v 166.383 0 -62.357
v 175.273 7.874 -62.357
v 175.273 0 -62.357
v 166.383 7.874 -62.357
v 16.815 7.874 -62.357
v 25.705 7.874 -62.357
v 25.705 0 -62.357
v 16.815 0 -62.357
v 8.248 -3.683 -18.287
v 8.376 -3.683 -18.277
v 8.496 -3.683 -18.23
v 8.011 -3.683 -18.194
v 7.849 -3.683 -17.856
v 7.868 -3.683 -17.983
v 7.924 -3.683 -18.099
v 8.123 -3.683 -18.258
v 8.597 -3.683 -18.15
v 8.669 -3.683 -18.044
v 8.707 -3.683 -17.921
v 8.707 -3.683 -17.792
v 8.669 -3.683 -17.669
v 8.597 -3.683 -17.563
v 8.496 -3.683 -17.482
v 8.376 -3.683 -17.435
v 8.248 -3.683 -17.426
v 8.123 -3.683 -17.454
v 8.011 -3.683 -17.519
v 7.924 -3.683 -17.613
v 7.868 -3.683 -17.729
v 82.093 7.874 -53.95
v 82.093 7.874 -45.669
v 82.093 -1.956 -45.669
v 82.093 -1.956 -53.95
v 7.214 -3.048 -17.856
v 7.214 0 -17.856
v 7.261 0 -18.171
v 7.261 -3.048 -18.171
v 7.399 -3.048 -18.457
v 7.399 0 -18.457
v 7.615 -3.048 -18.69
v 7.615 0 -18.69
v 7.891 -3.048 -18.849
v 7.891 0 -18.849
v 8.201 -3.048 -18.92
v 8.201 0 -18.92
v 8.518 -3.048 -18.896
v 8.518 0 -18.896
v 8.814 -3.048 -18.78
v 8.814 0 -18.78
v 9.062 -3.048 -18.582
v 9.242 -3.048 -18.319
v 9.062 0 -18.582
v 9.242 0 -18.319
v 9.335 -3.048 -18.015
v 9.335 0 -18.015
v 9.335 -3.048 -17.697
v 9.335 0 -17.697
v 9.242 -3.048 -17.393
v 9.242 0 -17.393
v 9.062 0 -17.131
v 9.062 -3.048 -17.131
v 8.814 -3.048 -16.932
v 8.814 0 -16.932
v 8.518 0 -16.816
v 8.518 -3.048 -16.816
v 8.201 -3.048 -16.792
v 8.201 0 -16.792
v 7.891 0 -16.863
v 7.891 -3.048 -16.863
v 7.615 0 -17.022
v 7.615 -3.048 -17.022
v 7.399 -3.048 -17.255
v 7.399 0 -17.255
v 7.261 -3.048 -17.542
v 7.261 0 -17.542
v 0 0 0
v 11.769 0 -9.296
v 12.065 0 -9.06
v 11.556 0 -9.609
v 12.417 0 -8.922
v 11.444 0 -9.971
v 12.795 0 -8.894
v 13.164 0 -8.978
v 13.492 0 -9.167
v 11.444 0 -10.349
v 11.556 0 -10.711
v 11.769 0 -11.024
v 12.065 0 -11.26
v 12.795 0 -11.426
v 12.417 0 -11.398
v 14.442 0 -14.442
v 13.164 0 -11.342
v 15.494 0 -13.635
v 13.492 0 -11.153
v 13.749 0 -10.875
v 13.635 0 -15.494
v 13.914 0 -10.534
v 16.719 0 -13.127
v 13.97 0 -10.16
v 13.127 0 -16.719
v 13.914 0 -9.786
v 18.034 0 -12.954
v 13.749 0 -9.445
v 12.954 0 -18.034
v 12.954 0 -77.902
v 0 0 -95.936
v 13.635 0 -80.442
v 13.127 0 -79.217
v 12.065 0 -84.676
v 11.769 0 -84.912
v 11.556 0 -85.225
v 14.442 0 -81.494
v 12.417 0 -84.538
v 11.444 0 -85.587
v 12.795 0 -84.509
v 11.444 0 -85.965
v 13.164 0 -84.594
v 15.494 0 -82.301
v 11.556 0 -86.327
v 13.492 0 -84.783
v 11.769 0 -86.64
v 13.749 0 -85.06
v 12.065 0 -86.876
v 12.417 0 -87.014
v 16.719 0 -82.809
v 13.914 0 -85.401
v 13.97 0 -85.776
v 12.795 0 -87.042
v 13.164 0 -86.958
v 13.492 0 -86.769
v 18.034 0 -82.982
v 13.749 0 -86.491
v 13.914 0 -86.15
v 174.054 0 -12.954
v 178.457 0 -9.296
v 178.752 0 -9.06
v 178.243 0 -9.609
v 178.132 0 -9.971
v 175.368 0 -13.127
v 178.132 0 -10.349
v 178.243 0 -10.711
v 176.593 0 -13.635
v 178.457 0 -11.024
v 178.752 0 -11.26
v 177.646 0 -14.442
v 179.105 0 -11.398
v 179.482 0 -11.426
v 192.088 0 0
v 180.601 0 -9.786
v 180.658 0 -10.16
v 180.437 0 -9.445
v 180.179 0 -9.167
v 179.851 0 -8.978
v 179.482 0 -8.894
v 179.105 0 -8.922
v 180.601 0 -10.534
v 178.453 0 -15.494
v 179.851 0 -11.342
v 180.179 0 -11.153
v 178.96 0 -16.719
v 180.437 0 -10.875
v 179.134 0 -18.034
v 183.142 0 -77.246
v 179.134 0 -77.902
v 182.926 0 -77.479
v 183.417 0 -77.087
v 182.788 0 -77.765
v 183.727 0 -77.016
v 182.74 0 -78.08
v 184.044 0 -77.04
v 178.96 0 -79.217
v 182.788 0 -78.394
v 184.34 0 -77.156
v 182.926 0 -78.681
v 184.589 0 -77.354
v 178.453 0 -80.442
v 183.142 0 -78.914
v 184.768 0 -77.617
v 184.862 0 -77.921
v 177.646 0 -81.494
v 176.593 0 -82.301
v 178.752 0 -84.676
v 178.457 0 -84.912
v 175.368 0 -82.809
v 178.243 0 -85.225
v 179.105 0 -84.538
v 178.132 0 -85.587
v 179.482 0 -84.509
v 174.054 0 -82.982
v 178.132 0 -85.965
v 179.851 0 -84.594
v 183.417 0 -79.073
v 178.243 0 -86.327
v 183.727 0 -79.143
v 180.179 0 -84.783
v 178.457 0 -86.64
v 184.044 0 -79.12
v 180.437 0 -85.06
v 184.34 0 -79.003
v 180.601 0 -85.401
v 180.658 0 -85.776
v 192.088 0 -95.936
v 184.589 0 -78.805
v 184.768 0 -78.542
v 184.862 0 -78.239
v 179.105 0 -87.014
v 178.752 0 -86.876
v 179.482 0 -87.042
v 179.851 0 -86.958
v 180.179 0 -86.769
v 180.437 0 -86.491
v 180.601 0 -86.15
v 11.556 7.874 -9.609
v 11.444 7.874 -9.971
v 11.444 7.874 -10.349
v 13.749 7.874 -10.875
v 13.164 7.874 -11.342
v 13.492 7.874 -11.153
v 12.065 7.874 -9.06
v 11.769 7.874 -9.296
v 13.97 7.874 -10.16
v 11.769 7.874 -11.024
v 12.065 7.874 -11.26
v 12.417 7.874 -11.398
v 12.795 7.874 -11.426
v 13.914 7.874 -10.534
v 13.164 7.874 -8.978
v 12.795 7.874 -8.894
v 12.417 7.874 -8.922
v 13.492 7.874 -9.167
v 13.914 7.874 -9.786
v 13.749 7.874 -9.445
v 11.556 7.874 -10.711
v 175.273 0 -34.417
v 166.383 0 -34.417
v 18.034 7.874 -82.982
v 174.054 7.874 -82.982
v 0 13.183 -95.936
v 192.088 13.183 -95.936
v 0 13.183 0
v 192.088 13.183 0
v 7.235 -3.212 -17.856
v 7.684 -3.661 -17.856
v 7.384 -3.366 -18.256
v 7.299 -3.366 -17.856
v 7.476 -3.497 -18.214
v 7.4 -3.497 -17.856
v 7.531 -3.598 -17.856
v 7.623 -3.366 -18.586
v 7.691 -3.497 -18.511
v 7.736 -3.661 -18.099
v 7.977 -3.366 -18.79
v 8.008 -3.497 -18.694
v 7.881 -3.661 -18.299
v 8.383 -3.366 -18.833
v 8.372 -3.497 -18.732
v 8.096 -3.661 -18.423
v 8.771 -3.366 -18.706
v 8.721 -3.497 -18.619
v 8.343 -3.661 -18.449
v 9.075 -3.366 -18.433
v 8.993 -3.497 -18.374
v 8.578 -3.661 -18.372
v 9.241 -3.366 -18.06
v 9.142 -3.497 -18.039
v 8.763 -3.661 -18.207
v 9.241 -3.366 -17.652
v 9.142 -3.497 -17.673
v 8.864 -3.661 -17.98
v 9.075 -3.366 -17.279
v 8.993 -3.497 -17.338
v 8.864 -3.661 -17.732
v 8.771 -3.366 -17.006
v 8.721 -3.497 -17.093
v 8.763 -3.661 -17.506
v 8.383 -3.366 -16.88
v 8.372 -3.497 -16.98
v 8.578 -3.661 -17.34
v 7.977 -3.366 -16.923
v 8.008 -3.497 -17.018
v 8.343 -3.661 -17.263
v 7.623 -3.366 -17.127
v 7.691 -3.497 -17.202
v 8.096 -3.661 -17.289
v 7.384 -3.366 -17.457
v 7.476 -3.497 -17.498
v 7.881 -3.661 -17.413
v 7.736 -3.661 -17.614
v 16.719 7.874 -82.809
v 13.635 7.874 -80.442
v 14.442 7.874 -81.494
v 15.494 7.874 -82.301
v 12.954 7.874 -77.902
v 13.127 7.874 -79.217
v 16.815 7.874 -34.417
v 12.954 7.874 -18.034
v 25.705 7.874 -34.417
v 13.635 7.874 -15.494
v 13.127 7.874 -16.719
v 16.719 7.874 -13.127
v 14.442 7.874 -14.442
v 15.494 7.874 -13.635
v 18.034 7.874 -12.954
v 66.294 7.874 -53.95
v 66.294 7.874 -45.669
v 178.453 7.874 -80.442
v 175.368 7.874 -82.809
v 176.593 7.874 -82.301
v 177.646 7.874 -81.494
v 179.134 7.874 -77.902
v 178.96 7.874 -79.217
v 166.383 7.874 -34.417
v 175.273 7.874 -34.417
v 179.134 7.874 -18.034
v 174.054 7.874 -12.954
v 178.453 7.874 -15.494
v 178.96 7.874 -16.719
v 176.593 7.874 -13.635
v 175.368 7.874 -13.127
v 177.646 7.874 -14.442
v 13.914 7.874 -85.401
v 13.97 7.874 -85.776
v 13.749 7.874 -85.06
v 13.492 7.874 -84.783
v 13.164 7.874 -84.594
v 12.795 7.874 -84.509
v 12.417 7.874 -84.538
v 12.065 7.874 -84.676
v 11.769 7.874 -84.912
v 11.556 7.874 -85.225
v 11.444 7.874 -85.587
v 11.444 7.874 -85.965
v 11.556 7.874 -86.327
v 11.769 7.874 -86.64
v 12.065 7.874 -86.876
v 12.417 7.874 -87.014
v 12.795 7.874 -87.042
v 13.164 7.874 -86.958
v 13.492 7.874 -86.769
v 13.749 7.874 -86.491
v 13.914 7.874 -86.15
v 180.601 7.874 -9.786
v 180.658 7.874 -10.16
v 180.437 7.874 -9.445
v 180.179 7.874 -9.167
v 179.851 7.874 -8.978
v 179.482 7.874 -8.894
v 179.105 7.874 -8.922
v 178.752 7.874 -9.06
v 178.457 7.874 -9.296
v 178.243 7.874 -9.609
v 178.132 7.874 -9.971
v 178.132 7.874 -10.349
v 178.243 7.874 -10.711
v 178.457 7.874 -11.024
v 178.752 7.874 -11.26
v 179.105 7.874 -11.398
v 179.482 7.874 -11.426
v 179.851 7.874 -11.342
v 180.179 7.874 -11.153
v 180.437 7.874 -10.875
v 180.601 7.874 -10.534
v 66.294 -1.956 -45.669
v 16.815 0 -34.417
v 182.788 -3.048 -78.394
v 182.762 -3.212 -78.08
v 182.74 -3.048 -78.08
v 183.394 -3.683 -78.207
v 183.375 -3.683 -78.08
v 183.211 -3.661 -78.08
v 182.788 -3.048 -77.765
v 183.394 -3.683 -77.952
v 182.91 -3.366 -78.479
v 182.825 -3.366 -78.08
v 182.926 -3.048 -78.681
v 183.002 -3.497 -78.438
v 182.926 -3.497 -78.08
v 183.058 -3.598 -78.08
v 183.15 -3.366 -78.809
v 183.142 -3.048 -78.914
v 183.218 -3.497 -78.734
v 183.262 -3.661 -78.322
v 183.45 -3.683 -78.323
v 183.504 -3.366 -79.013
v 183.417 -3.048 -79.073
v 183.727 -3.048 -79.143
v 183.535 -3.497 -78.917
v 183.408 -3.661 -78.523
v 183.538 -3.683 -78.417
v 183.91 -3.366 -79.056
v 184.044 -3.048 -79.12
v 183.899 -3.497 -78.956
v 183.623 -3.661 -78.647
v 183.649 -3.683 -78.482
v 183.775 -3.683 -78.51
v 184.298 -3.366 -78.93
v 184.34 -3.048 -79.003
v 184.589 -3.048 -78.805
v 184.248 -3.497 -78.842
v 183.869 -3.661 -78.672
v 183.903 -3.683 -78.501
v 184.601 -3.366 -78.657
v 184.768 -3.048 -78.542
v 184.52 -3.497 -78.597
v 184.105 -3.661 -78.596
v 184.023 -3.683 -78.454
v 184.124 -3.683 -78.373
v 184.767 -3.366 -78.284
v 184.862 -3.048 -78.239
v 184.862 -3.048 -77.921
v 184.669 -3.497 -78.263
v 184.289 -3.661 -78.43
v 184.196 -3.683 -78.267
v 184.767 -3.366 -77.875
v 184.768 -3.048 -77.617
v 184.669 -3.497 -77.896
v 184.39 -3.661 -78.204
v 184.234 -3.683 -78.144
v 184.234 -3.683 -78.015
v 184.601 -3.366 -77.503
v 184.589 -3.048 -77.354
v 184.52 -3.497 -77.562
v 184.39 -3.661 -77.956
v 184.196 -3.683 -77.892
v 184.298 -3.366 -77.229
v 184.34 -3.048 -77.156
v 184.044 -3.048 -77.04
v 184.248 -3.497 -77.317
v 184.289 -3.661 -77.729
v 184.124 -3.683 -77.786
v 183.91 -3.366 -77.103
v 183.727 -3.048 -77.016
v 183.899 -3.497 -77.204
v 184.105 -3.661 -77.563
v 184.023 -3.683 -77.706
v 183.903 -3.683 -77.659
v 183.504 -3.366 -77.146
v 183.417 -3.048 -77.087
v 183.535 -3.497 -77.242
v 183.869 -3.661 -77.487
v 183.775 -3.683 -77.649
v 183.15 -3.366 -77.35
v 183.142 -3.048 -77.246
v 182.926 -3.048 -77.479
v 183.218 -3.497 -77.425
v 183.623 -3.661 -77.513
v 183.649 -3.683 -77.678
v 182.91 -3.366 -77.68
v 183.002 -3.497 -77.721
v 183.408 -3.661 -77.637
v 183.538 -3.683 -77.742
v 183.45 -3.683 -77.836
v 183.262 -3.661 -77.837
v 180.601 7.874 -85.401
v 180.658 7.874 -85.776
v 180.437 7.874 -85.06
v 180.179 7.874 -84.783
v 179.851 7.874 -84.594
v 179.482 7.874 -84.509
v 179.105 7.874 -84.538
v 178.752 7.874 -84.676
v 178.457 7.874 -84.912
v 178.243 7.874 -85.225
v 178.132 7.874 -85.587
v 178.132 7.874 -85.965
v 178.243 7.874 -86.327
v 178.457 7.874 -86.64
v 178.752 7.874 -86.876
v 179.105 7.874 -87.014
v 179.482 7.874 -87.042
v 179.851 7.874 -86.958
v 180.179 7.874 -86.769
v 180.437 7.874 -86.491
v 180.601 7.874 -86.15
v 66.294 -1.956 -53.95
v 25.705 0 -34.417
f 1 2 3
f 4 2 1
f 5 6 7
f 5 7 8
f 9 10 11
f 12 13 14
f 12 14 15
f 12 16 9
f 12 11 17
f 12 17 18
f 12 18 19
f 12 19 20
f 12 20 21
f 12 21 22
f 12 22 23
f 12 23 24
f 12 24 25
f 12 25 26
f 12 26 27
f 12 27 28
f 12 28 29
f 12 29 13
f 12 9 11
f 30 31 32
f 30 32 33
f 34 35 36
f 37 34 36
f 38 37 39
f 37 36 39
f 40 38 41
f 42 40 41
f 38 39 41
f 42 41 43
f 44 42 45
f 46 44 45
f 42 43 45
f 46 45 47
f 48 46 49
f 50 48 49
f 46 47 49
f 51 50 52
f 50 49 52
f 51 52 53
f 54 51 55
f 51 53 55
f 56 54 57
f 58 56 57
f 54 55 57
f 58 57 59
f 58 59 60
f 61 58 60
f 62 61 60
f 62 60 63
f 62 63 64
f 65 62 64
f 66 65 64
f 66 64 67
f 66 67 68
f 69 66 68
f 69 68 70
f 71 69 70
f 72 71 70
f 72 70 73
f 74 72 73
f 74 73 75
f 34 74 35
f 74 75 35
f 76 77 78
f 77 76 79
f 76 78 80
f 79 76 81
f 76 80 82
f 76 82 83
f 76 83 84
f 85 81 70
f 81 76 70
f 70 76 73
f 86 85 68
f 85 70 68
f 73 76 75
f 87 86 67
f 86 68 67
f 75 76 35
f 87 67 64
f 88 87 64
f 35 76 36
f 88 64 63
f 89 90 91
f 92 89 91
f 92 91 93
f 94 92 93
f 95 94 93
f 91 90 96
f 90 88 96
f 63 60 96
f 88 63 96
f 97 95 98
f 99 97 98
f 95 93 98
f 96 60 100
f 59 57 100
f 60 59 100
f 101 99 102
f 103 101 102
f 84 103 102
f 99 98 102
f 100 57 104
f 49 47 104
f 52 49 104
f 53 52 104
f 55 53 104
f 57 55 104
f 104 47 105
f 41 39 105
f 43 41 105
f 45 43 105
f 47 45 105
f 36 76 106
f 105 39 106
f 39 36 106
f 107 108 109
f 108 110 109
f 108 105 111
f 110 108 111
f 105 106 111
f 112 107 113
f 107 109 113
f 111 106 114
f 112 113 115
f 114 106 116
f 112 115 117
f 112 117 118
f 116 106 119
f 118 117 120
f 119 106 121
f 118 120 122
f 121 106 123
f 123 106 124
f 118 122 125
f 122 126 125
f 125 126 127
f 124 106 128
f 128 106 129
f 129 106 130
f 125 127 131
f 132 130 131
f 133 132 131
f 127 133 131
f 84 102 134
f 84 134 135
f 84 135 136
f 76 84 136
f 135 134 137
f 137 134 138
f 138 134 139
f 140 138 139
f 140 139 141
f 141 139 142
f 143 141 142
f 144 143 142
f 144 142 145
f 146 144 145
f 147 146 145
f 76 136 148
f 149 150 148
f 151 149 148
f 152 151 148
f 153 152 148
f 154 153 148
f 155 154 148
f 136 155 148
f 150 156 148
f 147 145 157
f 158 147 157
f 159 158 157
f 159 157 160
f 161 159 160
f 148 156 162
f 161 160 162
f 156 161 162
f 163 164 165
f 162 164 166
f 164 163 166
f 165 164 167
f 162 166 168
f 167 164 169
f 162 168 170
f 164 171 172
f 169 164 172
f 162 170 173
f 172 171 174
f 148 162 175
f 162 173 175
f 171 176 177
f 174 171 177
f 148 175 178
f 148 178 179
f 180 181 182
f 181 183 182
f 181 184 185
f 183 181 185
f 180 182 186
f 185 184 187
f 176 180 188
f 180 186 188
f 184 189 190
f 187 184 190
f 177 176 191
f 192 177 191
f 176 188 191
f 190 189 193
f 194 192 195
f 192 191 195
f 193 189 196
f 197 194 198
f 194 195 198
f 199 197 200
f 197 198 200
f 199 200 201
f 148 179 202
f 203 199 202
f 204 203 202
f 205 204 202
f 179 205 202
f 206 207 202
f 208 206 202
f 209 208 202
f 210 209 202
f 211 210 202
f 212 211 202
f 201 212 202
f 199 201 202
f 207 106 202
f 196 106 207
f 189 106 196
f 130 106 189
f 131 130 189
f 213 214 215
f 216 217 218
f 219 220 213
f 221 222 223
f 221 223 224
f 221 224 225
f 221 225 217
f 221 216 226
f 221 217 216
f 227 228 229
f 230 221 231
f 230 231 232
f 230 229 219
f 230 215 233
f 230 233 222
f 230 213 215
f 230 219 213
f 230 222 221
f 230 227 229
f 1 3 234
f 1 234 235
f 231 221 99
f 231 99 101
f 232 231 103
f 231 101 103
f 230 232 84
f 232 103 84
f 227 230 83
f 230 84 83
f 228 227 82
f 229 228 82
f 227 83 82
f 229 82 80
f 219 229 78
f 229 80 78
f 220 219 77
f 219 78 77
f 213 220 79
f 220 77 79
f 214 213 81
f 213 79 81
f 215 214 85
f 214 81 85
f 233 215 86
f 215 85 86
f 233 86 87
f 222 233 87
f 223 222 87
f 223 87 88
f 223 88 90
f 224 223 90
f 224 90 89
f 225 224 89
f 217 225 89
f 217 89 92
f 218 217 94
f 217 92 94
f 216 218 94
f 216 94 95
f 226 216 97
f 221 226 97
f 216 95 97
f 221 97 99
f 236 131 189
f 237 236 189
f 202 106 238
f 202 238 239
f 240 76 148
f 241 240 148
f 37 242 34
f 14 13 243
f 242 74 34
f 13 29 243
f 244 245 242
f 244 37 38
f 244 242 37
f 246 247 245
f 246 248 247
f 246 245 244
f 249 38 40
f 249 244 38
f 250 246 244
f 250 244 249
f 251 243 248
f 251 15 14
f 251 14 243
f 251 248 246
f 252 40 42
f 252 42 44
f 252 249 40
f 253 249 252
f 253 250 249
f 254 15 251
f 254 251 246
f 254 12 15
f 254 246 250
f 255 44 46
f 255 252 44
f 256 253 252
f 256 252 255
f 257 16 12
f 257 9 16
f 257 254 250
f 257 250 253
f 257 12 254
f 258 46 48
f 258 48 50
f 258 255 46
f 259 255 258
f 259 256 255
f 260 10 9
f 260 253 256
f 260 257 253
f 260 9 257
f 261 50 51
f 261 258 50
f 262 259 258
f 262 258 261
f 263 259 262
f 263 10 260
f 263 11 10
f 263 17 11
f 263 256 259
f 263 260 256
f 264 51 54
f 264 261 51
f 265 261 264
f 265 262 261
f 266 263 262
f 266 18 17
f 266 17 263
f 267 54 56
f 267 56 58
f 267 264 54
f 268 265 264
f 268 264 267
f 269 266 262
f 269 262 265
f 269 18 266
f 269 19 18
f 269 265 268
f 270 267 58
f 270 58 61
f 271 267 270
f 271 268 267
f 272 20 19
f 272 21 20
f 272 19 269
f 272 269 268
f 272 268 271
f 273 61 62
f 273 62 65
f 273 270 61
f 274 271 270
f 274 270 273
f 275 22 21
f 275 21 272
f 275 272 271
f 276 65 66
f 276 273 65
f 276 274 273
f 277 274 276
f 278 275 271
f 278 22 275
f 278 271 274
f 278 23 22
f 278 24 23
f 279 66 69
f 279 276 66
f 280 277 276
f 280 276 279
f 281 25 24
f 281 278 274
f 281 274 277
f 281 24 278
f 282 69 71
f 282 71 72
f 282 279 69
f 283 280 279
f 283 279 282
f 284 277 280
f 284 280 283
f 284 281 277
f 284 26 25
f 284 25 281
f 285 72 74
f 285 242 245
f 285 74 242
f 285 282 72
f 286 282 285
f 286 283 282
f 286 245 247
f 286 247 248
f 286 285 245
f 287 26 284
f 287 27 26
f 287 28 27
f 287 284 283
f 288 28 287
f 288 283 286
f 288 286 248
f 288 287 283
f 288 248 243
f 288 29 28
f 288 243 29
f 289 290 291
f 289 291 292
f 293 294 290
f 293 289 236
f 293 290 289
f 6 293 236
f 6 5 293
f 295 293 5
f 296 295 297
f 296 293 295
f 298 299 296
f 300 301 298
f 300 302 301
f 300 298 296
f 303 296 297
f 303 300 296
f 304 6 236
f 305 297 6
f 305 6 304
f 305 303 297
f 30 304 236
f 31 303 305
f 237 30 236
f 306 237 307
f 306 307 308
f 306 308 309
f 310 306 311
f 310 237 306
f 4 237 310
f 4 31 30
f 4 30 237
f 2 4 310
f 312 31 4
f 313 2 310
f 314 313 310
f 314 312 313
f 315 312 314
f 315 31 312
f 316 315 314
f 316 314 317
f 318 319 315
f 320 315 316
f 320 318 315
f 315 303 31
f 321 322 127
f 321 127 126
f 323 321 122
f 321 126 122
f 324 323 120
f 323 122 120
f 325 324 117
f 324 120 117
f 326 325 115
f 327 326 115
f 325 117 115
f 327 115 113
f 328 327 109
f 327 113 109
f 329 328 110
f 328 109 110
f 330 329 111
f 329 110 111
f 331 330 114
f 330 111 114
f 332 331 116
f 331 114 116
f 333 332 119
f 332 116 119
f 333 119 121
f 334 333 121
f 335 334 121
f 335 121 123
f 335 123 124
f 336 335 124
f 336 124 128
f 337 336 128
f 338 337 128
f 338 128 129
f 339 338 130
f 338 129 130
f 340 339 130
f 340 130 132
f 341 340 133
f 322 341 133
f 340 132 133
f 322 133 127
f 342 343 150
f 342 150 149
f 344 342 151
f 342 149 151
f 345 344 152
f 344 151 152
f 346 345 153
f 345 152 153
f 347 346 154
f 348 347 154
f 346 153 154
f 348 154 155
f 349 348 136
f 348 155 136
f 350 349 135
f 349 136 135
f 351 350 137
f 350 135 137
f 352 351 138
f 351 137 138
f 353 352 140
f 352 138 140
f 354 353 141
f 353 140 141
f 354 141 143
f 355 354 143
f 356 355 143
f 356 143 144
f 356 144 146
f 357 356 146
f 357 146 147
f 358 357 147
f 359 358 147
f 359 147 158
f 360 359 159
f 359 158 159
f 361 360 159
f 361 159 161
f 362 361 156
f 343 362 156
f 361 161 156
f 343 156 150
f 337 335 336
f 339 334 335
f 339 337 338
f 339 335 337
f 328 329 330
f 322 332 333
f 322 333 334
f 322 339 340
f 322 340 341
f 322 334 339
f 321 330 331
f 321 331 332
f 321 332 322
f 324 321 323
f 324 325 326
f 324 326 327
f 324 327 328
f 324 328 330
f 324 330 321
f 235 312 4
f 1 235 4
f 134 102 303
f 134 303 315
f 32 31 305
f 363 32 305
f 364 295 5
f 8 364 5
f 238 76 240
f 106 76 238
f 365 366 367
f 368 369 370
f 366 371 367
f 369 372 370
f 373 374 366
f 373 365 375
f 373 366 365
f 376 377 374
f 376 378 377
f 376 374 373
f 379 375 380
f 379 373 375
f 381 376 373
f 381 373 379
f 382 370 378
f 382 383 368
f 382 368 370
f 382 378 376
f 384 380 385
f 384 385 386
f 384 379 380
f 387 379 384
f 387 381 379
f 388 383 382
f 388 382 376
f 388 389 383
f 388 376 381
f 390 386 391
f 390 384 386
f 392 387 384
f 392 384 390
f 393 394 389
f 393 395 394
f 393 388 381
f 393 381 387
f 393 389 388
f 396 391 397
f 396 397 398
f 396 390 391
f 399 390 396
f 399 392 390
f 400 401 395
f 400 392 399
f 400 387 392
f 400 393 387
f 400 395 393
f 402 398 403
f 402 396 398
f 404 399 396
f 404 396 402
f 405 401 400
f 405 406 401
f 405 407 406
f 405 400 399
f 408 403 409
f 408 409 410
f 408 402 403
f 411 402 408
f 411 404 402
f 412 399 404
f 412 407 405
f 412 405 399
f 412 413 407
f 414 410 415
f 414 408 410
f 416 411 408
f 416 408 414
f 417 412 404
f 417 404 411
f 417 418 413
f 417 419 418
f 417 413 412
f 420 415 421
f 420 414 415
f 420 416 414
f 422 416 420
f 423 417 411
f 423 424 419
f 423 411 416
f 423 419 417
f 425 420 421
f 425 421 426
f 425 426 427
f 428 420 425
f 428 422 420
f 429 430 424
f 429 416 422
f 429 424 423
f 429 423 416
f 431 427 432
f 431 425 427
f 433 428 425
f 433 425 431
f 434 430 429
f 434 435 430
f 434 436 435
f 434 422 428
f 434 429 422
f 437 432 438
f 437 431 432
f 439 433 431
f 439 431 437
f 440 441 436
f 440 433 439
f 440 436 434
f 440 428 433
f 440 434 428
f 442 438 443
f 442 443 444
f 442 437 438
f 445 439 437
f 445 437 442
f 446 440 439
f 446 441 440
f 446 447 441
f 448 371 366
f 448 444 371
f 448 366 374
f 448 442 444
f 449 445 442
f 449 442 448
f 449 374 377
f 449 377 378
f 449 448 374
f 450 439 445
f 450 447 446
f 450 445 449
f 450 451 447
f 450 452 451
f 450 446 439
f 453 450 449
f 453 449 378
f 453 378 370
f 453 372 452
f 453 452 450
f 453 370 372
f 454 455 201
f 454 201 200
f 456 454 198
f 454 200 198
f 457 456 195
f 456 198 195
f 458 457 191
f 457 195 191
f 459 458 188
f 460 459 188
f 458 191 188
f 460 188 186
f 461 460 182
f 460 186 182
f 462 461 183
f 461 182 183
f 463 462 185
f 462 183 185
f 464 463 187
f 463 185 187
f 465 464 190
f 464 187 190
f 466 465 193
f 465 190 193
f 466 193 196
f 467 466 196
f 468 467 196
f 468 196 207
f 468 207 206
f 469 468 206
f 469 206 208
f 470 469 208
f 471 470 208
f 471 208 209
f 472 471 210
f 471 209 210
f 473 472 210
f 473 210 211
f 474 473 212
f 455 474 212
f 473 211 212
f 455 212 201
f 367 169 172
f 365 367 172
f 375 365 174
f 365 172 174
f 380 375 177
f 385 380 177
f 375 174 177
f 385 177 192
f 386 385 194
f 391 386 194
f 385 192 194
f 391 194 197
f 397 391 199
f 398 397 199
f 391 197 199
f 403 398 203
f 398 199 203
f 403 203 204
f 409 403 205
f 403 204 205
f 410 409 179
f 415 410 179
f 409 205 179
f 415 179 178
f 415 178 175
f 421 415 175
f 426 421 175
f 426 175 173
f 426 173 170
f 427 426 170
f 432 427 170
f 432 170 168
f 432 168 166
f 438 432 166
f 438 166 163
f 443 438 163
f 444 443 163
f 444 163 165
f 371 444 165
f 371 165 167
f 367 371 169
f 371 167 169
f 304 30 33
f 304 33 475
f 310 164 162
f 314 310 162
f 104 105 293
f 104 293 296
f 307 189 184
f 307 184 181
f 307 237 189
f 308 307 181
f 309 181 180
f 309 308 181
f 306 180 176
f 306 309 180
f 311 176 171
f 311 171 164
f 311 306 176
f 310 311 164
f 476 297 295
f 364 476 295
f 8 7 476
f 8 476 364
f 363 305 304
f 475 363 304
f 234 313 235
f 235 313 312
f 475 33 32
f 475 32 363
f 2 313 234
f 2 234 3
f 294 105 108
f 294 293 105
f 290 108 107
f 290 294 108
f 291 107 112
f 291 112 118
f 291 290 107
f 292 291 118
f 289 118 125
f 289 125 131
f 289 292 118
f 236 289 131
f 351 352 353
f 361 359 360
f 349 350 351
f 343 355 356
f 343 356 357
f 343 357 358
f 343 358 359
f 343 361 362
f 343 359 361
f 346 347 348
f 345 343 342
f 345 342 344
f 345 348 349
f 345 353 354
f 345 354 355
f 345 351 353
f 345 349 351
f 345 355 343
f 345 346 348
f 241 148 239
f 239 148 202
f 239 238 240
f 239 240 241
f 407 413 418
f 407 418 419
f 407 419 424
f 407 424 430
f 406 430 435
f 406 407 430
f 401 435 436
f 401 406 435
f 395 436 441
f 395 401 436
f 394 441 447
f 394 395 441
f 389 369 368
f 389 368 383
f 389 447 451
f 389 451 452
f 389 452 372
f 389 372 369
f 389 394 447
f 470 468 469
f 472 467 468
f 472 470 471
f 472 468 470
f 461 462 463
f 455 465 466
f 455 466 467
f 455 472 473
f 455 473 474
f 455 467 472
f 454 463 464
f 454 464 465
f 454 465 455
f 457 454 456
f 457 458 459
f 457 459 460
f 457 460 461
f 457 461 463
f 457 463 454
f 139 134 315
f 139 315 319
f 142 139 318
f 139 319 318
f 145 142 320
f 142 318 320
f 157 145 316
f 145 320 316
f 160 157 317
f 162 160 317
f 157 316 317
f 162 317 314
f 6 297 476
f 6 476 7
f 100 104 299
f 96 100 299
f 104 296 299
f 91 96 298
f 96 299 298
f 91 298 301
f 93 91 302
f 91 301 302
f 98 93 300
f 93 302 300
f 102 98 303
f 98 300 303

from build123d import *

# Parameters (mm, degrees)
SKETCH1_W           = 192.0875
SKETCH1_H           = 95.9358
BOSS_EXTRUDE1_DEPTH = 13.1826
SKETCH2_W           = 166.1795
SKETCH2_H           = 70.0278
CUT_EXTRUDE1_DEPTH  = 7.874
SKETCH3_R           = 1.27
CUT_EXTRUDE2_DEPTH  = 7.874
SKETCH4_W           = 15.7988
SKETCH4_H           = 8.2804
BOSS_EXTRUDE2_DEPTH = 9.8298
SKETCH5_W           = 8.89
SKETCH5_H           = 27.94
BOSS_EXTRUDE3_DEPTH = 7.874
SKETCH6_R           = 1.0668
BOSS_EXTRUDE4_DEPTH = 3.683
FILLET1_R           = 5.08
FILLET2_R           = 0.635


with BuildPart() as part:
    # Sketch1 → Boss-Extrude1 (new body)
    with BuildSketch(Plane(origin=(0, 0, 0), x_dir=(1, 0, 0), z_dir=(0, 1, 0))):
        with Locations((96.04375, 47.9679)):
            Rectangle(SKETCH1_W, SKETCH1_H)
    extrude(amount=BOSS_EXTRUDE1_DEPTH)

    # Sketch2 → Cut-Extrude1 (cut)
    with BuildSketch(Plane.XZ):
        with Locations((96.04375, -47.9679)):
            Rectangle(SKETCH2_W, SKETCH2_H)
    extrude(amount=-CUT_EXTRUDE1_DEPTH, mode=Mode.SUBTRACT)

    # Sketch3 → Cut-Extrude2 (cut)
    with BuildSketch(Plane.XZ):
        with Locations((12.7, -85.7758)):
            Circle(SKETCH3_R)
        with Locations((12.7, -10.16)):
            Circle(SKETCH3_R)
        with Locations((179.3875, -85.7758)):
            Circle(SKETCH3_R)
        with Locations((179.3875, -10.16)):
            Circle(SKETCH3_R)
    extrude(amount=-CUT_EXTRUDE2_DEPTH, mode=Mode.SUBTRACT)

    # Sketch4 → Boss-Extrude2 (add)
    with BuildSketch(Plane(origin=(0, 7.874, 0), x_dir=(-1, 0, 0), z_dir=(0, -1, 0))):
        with Locations((-74.1934, 49.8094)):
            Rectangle(SKETCH4_W, SKETCH4_H)
    extrude(amount=BOSS_EXTRUDE2_DEPTH)

    # Sketch5 → Boss-Extrude3 (add)
    with BuildSketch(Plane(origin=(0, 7.874, 0), x_dir=(-1, 0, 0), z_dir=(0, -1, 0))):
        with Locations((-21.2598, 48.387)):
            Rectangle(SKETCH5_W, SKETCH5_H)
        with Locations((-170.8277, 48.387)):
            Rectangle(SKETCH5_W, SKETCH5_H)
    extrude(amount=BOSS_EXTRUDE3_DEPTH)

    # Sketch6 → Boss-Extrude4 (add)
    with BuildSketch(Plane(origin=(0, 0, 0), x_dir=(-1, 0, 0), z_dir=(0, -1, 0))):
        with Locations((-8.2804, 17.8562)):
            Circle(SKETCH6_R)
        with Locations((-183.8071, 78.0796)):
            Circle(SKETCH6_R)
    extrude(amount=BOSS_EXTRUDE4_DEPTH)

    # Fillet1
    fillet1_edges = [part.edges().sort_by_distance(p)[0] for p in [
        (12.954, 3.937, -82.9818),
        (12.954, 3.937, -12.954),
        (179.1335, 3.937, -12.954),
        (179.1335, 3.937, -82.9818),
    ]]
    fillet(fillet1_edges, radius=FILLET1_R)

    # Fillet2
    fillet2_edges = [part.edges().sort_by_distance(p)[0] for p in [
        (9.3472, -3.683, -17.8562),
        (184.8739, -3.683, -78.0796),
    ]]
    fillet(fillet2_edges, radius=FILLET2_R)


solid = part.part
